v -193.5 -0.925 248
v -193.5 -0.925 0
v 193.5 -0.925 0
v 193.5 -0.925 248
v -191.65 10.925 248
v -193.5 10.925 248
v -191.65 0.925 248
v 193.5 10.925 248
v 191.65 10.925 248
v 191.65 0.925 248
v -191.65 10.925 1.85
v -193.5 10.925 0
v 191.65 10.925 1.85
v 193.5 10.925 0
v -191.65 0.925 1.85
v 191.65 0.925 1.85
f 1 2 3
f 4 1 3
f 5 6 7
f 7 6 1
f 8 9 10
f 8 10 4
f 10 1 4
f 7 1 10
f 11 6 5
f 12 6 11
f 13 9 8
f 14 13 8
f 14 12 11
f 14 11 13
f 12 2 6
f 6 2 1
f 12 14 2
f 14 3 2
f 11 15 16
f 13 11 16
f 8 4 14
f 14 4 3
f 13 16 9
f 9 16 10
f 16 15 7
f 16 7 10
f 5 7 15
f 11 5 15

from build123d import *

# Parameters (mm, degrees)
SZKIC1_W                    = 387
SZKIC1_H                    = 1.85
DODANIE_WYCI_GNI_CIE1_DEPTH = 248
DODANIE_WYCI_GNI_CIE2_DEPTH = 10


with BuildPart() as part:
    # Szkic1 → Dodanie-wyciągnięcie1 (new body)
    with BuildSketch(Plane.XY):
        Rectangle(SZKIC1_W, SZKIC1_H)
    extrude(amount=DODANIE_WYCI_GNI_CIE1_DEPTH)

    # Szkic3 → Dodanie-wyciągnięcie2 (add)
    with BuildSketch(Plane(origin=(0, 0.925, 0), x_dir=(1, 0, 0), z_dir=(0, 1, 0))):
        Polygon((193.5, -248), (193.5, 0), (-193.5, 0), (-193.5, -248), (-191.65, -248), (-191.65, -1.85), (191.65, -1.85), (191.65, -248), align=None)
    extrude(amount=DODANIE_WYCI_GNI_CIE2_DEPTH)


solid = part.part
